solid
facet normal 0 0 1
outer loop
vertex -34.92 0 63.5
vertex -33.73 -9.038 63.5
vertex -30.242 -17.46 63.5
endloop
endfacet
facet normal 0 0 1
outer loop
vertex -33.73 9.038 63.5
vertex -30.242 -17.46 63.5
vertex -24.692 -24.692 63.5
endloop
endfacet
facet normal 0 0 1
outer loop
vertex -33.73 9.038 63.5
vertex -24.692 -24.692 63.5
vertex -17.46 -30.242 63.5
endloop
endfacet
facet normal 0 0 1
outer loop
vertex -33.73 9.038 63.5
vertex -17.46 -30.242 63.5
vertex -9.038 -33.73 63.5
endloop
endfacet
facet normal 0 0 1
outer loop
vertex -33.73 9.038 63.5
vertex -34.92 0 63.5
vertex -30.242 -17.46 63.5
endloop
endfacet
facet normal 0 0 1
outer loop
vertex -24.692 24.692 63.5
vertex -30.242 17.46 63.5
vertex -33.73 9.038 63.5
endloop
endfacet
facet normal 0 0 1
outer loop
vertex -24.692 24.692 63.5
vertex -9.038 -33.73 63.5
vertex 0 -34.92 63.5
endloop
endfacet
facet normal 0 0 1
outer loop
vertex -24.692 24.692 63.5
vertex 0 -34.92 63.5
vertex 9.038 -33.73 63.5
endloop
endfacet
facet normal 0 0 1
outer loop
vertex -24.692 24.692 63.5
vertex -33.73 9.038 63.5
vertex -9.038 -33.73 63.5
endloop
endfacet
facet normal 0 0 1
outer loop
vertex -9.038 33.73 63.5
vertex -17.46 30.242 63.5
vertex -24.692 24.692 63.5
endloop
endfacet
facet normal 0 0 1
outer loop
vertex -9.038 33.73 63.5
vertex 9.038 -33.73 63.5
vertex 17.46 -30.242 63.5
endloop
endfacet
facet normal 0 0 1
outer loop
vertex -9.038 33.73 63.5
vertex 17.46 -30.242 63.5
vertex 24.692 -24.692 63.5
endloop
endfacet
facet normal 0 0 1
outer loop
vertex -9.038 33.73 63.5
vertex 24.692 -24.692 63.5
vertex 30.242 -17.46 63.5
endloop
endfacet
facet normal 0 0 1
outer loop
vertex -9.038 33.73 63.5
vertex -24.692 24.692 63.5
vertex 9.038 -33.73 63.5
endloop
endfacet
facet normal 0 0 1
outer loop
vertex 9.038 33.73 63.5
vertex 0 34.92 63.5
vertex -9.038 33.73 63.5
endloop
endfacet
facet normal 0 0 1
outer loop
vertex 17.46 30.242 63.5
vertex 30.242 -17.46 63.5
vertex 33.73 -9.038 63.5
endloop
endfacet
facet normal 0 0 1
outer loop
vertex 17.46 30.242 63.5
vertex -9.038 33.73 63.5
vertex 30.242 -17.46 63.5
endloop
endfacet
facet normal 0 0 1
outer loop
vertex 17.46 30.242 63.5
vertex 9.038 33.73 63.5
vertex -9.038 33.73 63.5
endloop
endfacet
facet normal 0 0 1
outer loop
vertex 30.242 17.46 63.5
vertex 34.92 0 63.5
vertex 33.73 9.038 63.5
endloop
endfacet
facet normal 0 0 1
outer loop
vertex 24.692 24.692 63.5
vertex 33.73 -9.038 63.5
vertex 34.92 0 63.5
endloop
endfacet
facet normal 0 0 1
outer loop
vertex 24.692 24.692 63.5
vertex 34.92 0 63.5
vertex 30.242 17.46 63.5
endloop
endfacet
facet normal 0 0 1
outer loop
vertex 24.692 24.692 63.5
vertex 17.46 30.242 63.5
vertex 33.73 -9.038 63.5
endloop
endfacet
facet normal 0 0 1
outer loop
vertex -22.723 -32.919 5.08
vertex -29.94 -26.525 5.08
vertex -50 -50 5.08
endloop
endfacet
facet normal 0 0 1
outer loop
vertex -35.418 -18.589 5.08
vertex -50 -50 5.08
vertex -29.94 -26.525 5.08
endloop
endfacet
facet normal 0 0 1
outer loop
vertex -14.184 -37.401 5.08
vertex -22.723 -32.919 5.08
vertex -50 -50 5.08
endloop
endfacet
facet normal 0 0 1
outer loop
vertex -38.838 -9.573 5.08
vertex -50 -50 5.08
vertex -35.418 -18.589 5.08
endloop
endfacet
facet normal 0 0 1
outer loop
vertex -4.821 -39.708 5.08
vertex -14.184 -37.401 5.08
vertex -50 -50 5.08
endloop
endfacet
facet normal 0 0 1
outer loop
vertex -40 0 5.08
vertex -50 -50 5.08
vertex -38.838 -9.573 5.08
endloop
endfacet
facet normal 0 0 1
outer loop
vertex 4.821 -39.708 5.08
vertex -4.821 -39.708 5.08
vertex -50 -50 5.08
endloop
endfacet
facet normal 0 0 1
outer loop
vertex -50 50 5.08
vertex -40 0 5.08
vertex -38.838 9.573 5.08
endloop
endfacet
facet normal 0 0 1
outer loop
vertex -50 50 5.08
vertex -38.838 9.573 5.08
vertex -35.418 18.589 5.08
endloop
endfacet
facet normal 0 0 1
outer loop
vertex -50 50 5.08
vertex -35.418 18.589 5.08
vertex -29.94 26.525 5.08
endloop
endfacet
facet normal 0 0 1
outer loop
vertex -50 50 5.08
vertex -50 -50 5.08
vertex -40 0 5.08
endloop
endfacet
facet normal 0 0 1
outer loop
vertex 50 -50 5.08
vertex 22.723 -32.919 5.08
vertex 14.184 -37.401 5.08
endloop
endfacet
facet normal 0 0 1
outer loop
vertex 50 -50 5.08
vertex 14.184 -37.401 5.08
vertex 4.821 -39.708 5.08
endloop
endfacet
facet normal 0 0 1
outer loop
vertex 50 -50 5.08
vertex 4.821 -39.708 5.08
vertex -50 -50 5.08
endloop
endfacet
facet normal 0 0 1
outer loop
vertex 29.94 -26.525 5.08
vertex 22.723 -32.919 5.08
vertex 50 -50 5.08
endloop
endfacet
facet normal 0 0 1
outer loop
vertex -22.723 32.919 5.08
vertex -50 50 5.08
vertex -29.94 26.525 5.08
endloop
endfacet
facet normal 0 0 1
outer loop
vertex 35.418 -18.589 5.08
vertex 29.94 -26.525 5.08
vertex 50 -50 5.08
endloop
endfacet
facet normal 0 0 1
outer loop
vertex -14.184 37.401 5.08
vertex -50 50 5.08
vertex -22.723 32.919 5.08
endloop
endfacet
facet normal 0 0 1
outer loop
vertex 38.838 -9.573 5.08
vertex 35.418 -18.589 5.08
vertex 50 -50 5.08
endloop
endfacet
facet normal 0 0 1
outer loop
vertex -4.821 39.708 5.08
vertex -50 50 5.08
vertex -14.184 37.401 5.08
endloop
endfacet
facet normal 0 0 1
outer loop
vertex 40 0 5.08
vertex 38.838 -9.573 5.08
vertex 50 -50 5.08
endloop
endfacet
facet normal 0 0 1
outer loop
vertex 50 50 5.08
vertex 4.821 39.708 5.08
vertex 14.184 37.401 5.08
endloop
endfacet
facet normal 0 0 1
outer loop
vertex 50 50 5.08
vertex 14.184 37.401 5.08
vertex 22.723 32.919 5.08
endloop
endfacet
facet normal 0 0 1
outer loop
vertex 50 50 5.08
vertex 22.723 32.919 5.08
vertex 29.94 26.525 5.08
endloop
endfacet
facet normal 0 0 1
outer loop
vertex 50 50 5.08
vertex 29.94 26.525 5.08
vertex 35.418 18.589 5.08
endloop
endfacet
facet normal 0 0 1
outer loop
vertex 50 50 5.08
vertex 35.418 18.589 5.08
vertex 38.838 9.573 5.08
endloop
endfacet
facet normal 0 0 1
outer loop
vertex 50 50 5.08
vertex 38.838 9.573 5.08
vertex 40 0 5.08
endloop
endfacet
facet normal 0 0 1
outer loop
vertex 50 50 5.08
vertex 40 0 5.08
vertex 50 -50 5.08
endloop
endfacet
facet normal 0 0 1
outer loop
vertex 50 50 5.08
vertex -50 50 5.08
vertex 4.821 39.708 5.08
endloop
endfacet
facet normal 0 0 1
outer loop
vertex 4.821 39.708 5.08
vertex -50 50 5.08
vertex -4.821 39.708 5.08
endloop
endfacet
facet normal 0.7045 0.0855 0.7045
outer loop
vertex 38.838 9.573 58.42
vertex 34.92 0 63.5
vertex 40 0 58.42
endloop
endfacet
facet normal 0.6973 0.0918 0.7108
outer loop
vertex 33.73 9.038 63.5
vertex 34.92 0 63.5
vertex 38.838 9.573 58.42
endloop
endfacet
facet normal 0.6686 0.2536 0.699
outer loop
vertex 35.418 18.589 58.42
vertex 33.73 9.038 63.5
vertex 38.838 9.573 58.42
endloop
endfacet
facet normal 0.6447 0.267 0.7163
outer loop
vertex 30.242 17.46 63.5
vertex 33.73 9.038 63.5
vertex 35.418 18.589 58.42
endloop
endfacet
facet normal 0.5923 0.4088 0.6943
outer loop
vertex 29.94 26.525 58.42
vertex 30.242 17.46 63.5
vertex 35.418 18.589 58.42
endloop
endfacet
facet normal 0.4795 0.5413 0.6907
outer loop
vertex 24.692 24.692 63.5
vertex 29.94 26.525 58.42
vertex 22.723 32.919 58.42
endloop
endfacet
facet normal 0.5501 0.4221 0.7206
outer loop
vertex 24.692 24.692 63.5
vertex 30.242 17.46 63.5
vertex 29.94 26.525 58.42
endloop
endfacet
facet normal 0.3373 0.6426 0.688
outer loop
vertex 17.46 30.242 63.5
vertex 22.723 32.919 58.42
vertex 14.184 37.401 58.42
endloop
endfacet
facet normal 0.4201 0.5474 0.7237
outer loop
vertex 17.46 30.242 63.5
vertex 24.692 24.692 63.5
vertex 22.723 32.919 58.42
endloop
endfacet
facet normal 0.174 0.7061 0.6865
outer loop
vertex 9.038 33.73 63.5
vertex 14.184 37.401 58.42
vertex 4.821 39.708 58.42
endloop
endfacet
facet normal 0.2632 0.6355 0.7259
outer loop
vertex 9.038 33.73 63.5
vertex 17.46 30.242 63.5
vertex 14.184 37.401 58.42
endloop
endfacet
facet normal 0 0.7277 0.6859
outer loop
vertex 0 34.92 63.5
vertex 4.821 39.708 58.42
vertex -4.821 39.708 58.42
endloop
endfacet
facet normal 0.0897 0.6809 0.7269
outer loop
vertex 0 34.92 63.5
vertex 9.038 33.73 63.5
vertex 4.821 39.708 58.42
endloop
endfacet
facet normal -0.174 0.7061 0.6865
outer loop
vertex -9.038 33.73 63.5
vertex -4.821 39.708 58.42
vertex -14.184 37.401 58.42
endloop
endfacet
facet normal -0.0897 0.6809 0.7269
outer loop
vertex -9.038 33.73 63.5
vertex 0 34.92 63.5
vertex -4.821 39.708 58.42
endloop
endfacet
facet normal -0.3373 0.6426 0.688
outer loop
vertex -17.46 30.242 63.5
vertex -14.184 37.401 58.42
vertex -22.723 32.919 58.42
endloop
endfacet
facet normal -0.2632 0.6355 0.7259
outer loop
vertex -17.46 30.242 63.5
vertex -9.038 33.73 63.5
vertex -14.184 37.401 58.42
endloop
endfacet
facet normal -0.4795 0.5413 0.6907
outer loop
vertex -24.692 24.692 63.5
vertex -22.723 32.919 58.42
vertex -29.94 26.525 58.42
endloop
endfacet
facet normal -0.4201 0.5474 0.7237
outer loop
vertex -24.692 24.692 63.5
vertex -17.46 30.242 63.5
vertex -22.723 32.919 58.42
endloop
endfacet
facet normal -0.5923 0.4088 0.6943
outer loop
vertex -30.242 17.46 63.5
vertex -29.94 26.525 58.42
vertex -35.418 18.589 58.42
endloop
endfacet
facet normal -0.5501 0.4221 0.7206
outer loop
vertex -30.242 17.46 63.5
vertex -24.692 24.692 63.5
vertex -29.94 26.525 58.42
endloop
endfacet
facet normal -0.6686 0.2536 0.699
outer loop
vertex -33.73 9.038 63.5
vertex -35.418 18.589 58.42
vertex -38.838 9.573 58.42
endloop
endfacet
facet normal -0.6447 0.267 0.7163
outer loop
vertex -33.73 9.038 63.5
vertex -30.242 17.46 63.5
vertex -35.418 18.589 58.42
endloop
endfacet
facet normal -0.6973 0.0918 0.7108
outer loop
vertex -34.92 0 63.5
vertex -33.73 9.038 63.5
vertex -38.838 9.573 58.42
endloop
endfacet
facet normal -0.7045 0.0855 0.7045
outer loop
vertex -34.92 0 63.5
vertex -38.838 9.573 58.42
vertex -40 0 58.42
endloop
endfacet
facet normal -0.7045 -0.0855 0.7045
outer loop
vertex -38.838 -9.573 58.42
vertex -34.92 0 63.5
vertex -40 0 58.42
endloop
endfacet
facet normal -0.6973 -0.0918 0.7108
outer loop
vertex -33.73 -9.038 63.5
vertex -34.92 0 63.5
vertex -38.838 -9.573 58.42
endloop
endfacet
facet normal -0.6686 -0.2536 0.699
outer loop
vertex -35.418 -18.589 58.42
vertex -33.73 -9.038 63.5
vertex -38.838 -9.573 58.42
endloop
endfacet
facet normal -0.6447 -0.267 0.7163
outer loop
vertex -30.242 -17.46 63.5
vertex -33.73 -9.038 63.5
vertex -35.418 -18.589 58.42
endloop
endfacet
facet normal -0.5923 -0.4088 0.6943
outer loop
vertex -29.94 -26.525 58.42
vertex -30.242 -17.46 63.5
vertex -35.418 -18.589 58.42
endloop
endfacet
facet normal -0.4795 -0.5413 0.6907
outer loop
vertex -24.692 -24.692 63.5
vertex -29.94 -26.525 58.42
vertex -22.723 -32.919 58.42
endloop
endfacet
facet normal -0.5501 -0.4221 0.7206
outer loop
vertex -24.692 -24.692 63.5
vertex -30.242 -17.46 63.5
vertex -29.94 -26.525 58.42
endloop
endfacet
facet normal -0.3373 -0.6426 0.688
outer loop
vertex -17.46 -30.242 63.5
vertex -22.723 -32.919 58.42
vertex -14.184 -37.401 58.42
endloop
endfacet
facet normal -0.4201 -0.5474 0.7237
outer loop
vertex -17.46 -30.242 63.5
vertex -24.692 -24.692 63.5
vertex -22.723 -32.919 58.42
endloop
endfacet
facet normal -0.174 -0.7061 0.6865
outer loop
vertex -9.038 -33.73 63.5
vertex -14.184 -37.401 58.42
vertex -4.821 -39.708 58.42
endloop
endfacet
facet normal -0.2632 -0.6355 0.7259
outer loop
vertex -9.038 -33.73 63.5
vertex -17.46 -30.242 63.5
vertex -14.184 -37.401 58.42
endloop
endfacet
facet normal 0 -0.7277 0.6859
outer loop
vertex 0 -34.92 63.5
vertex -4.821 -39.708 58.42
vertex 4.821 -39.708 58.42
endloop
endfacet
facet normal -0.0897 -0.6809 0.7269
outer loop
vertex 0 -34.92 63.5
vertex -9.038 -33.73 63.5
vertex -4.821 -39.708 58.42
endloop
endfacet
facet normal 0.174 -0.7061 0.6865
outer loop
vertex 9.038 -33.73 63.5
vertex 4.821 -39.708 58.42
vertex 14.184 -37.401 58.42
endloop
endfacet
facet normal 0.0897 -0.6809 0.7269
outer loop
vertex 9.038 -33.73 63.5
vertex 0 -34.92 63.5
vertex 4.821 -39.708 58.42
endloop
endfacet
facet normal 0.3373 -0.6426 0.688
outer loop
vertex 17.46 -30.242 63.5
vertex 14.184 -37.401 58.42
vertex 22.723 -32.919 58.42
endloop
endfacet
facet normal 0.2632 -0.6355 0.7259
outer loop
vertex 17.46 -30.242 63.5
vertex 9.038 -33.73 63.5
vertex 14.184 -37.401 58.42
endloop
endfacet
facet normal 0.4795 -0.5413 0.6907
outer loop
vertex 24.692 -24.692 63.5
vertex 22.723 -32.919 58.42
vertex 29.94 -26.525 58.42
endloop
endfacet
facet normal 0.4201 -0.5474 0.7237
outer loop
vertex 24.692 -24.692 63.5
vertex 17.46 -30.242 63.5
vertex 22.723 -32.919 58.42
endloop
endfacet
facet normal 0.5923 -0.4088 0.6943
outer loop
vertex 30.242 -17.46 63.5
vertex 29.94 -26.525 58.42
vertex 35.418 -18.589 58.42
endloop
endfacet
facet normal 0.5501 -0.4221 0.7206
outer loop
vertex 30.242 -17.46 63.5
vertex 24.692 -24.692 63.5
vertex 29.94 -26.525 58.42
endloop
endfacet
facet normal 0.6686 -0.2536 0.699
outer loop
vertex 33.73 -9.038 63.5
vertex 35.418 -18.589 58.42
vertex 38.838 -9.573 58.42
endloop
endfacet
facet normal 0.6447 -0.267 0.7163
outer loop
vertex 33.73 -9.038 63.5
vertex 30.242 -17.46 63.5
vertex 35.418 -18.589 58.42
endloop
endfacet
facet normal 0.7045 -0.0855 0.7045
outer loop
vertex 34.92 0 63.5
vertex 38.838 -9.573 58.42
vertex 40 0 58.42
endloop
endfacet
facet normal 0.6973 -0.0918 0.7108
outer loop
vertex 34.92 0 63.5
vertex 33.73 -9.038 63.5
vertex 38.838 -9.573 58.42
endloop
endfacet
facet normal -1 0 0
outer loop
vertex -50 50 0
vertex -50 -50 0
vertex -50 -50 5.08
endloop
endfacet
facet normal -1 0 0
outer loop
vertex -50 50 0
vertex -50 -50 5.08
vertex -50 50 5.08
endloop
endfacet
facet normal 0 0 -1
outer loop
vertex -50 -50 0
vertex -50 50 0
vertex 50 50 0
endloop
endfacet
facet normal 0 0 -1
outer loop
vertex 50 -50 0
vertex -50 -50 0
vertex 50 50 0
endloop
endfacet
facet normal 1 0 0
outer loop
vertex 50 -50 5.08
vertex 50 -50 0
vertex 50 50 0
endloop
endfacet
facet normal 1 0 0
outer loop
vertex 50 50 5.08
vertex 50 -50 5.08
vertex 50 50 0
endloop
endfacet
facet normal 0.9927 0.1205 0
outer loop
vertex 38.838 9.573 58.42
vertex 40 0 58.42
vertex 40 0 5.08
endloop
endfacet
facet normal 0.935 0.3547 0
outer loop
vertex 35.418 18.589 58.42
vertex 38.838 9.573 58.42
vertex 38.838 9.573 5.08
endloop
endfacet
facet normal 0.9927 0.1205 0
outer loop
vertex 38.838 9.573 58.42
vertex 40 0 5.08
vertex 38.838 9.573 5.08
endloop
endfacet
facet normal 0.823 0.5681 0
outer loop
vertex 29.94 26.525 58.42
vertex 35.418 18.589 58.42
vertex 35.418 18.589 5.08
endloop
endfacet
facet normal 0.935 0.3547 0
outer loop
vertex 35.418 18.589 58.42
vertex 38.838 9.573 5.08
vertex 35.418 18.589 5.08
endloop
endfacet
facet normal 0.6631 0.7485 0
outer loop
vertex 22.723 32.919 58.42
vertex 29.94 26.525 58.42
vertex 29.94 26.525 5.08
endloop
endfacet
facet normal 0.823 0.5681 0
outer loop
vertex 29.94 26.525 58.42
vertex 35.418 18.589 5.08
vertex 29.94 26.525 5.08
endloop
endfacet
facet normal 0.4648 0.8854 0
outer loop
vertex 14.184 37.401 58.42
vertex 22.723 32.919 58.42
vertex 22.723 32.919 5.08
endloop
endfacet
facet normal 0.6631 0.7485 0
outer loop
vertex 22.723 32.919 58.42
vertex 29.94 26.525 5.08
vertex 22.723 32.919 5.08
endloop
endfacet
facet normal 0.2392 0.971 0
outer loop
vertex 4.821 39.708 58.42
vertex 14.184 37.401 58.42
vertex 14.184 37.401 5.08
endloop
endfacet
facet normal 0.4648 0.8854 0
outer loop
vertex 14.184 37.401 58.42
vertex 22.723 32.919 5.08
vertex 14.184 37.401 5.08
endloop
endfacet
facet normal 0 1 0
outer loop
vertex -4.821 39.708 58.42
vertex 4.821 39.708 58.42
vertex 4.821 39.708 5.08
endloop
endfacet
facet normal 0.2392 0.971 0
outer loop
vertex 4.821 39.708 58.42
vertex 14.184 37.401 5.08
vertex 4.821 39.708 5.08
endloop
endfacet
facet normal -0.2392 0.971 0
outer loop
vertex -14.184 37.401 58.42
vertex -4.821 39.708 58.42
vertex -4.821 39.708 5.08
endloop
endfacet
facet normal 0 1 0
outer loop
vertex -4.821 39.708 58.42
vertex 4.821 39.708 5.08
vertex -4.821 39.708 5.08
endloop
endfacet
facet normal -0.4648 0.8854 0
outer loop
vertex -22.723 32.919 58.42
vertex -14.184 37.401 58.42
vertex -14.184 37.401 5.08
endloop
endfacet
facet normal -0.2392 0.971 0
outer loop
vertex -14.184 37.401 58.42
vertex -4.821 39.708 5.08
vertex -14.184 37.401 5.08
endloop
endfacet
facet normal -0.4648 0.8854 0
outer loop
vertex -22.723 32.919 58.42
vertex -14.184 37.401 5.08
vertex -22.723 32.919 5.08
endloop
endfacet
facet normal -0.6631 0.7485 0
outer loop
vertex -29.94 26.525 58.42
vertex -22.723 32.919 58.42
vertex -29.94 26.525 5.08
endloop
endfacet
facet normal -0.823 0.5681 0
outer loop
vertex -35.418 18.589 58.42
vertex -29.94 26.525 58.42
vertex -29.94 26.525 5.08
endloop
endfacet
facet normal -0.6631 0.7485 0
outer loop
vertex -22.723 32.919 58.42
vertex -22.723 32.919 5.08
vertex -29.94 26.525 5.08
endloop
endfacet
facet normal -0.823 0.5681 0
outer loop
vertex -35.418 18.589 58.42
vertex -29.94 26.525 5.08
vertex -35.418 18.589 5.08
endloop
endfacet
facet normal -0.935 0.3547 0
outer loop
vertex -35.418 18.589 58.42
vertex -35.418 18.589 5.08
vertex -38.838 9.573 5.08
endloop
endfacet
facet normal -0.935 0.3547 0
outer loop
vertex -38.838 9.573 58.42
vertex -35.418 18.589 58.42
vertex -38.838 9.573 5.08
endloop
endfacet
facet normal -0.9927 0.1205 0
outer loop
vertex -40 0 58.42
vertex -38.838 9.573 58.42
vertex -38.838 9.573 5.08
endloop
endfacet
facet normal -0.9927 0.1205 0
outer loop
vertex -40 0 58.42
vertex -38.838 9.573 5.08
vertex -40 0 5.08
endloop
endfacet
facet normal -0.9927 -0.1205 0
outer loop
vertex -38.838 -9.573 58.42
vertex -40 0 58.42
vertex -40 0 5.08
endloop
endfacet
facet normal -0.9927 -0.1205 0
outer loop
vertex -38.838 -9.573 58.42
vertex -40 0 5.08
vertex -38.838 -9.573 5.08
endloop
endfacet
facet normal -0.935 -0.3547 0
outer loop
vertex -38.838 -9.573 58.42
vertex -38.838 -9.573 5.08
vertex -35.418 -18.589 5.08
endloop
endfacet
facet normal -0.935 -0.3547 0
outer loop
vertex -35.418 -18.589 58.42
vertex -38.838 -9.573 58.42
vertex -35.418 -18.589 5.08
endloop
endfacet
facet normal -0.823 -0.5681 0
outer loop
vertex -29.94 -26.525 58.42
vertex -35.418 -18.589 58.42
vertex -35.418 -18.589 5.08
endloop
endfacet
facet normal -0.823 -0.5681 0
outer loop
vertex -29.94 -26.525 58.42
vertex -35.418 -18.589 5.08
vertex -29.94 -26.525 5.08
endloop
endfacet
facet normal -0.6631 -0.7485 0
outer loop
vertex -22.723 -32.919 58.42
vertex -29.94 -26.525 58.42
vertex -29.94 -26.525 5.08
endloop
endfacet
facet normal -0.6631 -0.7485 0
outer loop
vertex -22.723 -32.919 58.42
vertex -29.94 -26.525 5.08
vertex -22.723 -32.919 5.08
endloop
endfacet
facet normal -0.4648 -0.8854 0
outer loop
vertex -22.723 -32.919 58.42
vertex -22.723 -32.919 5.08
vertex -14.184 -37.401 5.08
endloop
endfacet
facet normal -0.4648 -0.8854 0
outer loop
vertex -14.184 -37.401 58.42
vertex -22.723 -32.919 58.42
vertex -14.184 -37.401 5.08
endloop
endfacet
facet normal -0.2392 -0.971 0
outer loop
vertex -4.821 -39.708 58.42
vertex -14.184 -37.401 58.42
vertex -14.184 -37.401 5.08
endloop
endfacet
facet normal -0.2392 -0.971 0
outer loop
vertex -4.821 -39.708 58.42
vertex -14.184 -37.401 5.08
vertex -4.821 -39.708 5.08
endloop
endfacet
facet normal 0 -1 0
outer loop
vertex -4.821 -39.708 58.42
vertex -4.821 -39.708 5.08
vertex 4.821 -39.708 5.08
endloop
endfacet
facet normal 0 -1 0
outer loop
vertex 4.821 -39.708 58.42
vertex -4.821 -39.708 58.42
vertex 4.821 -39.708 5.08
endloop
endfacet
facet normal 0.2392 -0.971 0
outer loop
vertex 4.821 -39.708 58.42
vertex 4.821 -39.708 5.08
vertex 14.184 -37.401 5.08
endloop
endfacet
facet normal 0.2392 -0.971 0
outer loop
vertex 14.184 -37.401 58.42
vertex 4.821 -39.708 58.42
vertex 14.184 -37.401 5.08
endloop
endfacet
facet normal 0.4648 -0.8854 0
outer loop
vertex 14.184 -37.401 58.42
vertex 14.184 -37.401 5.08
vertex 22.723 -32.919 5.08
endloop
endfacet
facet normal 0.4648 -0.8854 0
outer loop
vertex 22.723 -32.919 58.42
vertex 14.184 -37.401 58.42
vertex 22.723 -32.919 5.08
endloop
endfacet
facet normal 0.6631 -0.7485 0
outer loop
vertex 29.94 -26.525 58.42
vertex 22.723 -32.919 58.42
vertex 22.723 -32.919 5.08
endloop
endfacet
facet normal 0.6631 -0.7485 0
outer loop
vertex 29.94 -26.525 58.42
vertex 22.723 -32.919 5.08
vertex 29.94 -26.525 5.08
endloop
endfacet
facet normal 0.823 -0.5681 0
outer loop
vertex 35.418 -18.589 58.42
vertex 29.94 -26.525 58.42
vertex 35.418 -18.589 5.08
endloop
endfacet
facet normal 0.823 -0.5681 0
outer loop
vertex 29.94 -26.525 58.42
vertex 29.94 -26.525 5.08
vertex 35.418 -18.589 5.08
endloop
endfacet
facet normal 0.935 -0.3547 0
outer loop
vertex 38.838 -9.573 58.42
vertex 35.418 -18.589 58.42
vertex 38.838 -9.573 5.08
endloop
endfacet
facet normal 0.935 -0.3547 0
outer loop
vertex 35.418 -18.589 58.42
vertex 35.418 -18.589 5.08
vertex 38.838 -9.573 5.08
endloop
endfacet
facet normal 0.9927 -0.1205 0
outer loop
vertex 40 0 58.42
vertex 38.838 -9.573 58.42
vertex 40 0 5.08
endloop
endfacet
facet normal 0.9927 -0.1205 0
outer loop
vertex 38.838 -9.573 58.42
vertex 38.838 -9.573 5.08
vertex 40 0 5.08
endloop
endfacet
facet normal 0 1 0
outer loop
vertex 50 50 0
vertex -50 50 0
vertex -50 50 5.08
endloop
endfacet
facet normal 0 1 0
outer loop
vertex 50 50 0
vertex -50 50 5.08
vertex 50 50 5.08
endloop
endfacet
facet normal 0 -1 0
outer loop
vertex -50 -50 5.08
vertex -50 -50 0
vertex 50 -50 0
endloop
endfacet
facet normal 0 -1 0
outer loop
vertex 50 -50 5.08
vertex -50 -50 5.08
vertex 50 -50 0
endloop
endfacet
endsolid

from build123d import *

# Parameters (mm, degrees)
SKETCH1_W           = 100
SKETCH1_H           = 100
BOSS_EXTRUDE1_DEPTH = 5.08
SKETCH2_R           = 40
BOSS_EXTRUDE2_DEPTH = 63.5
CHAMFER1_SIZE       = 5.08


with BuildPart() as part:
    # Sketch1 → Boss-Extrude1 (new body)
    with BuildSketch(Plane.XY):
        Rectangle(SKETCH1_W, SKETCH1_H)
    extrude(amount=BOSS_EXTRUDE1_DEPTH)

    # Sketch2 → Boss-Extrude2 (add)
    with BuildSketch(Plane.XY):
        Circle(SKETCH2_R)
    extrude(amount=BOSS_EXTRUDE2_DEPTH)

    # Chamfer1
    chamfer1_edges = [part.edges().sort_by_distance(p)[0] for p in [
        (-40, 0, 63.5),
    ]]
    chamfer(chamfer1_edges, length=CHAMFER1_SIZE)


solid = part.part
